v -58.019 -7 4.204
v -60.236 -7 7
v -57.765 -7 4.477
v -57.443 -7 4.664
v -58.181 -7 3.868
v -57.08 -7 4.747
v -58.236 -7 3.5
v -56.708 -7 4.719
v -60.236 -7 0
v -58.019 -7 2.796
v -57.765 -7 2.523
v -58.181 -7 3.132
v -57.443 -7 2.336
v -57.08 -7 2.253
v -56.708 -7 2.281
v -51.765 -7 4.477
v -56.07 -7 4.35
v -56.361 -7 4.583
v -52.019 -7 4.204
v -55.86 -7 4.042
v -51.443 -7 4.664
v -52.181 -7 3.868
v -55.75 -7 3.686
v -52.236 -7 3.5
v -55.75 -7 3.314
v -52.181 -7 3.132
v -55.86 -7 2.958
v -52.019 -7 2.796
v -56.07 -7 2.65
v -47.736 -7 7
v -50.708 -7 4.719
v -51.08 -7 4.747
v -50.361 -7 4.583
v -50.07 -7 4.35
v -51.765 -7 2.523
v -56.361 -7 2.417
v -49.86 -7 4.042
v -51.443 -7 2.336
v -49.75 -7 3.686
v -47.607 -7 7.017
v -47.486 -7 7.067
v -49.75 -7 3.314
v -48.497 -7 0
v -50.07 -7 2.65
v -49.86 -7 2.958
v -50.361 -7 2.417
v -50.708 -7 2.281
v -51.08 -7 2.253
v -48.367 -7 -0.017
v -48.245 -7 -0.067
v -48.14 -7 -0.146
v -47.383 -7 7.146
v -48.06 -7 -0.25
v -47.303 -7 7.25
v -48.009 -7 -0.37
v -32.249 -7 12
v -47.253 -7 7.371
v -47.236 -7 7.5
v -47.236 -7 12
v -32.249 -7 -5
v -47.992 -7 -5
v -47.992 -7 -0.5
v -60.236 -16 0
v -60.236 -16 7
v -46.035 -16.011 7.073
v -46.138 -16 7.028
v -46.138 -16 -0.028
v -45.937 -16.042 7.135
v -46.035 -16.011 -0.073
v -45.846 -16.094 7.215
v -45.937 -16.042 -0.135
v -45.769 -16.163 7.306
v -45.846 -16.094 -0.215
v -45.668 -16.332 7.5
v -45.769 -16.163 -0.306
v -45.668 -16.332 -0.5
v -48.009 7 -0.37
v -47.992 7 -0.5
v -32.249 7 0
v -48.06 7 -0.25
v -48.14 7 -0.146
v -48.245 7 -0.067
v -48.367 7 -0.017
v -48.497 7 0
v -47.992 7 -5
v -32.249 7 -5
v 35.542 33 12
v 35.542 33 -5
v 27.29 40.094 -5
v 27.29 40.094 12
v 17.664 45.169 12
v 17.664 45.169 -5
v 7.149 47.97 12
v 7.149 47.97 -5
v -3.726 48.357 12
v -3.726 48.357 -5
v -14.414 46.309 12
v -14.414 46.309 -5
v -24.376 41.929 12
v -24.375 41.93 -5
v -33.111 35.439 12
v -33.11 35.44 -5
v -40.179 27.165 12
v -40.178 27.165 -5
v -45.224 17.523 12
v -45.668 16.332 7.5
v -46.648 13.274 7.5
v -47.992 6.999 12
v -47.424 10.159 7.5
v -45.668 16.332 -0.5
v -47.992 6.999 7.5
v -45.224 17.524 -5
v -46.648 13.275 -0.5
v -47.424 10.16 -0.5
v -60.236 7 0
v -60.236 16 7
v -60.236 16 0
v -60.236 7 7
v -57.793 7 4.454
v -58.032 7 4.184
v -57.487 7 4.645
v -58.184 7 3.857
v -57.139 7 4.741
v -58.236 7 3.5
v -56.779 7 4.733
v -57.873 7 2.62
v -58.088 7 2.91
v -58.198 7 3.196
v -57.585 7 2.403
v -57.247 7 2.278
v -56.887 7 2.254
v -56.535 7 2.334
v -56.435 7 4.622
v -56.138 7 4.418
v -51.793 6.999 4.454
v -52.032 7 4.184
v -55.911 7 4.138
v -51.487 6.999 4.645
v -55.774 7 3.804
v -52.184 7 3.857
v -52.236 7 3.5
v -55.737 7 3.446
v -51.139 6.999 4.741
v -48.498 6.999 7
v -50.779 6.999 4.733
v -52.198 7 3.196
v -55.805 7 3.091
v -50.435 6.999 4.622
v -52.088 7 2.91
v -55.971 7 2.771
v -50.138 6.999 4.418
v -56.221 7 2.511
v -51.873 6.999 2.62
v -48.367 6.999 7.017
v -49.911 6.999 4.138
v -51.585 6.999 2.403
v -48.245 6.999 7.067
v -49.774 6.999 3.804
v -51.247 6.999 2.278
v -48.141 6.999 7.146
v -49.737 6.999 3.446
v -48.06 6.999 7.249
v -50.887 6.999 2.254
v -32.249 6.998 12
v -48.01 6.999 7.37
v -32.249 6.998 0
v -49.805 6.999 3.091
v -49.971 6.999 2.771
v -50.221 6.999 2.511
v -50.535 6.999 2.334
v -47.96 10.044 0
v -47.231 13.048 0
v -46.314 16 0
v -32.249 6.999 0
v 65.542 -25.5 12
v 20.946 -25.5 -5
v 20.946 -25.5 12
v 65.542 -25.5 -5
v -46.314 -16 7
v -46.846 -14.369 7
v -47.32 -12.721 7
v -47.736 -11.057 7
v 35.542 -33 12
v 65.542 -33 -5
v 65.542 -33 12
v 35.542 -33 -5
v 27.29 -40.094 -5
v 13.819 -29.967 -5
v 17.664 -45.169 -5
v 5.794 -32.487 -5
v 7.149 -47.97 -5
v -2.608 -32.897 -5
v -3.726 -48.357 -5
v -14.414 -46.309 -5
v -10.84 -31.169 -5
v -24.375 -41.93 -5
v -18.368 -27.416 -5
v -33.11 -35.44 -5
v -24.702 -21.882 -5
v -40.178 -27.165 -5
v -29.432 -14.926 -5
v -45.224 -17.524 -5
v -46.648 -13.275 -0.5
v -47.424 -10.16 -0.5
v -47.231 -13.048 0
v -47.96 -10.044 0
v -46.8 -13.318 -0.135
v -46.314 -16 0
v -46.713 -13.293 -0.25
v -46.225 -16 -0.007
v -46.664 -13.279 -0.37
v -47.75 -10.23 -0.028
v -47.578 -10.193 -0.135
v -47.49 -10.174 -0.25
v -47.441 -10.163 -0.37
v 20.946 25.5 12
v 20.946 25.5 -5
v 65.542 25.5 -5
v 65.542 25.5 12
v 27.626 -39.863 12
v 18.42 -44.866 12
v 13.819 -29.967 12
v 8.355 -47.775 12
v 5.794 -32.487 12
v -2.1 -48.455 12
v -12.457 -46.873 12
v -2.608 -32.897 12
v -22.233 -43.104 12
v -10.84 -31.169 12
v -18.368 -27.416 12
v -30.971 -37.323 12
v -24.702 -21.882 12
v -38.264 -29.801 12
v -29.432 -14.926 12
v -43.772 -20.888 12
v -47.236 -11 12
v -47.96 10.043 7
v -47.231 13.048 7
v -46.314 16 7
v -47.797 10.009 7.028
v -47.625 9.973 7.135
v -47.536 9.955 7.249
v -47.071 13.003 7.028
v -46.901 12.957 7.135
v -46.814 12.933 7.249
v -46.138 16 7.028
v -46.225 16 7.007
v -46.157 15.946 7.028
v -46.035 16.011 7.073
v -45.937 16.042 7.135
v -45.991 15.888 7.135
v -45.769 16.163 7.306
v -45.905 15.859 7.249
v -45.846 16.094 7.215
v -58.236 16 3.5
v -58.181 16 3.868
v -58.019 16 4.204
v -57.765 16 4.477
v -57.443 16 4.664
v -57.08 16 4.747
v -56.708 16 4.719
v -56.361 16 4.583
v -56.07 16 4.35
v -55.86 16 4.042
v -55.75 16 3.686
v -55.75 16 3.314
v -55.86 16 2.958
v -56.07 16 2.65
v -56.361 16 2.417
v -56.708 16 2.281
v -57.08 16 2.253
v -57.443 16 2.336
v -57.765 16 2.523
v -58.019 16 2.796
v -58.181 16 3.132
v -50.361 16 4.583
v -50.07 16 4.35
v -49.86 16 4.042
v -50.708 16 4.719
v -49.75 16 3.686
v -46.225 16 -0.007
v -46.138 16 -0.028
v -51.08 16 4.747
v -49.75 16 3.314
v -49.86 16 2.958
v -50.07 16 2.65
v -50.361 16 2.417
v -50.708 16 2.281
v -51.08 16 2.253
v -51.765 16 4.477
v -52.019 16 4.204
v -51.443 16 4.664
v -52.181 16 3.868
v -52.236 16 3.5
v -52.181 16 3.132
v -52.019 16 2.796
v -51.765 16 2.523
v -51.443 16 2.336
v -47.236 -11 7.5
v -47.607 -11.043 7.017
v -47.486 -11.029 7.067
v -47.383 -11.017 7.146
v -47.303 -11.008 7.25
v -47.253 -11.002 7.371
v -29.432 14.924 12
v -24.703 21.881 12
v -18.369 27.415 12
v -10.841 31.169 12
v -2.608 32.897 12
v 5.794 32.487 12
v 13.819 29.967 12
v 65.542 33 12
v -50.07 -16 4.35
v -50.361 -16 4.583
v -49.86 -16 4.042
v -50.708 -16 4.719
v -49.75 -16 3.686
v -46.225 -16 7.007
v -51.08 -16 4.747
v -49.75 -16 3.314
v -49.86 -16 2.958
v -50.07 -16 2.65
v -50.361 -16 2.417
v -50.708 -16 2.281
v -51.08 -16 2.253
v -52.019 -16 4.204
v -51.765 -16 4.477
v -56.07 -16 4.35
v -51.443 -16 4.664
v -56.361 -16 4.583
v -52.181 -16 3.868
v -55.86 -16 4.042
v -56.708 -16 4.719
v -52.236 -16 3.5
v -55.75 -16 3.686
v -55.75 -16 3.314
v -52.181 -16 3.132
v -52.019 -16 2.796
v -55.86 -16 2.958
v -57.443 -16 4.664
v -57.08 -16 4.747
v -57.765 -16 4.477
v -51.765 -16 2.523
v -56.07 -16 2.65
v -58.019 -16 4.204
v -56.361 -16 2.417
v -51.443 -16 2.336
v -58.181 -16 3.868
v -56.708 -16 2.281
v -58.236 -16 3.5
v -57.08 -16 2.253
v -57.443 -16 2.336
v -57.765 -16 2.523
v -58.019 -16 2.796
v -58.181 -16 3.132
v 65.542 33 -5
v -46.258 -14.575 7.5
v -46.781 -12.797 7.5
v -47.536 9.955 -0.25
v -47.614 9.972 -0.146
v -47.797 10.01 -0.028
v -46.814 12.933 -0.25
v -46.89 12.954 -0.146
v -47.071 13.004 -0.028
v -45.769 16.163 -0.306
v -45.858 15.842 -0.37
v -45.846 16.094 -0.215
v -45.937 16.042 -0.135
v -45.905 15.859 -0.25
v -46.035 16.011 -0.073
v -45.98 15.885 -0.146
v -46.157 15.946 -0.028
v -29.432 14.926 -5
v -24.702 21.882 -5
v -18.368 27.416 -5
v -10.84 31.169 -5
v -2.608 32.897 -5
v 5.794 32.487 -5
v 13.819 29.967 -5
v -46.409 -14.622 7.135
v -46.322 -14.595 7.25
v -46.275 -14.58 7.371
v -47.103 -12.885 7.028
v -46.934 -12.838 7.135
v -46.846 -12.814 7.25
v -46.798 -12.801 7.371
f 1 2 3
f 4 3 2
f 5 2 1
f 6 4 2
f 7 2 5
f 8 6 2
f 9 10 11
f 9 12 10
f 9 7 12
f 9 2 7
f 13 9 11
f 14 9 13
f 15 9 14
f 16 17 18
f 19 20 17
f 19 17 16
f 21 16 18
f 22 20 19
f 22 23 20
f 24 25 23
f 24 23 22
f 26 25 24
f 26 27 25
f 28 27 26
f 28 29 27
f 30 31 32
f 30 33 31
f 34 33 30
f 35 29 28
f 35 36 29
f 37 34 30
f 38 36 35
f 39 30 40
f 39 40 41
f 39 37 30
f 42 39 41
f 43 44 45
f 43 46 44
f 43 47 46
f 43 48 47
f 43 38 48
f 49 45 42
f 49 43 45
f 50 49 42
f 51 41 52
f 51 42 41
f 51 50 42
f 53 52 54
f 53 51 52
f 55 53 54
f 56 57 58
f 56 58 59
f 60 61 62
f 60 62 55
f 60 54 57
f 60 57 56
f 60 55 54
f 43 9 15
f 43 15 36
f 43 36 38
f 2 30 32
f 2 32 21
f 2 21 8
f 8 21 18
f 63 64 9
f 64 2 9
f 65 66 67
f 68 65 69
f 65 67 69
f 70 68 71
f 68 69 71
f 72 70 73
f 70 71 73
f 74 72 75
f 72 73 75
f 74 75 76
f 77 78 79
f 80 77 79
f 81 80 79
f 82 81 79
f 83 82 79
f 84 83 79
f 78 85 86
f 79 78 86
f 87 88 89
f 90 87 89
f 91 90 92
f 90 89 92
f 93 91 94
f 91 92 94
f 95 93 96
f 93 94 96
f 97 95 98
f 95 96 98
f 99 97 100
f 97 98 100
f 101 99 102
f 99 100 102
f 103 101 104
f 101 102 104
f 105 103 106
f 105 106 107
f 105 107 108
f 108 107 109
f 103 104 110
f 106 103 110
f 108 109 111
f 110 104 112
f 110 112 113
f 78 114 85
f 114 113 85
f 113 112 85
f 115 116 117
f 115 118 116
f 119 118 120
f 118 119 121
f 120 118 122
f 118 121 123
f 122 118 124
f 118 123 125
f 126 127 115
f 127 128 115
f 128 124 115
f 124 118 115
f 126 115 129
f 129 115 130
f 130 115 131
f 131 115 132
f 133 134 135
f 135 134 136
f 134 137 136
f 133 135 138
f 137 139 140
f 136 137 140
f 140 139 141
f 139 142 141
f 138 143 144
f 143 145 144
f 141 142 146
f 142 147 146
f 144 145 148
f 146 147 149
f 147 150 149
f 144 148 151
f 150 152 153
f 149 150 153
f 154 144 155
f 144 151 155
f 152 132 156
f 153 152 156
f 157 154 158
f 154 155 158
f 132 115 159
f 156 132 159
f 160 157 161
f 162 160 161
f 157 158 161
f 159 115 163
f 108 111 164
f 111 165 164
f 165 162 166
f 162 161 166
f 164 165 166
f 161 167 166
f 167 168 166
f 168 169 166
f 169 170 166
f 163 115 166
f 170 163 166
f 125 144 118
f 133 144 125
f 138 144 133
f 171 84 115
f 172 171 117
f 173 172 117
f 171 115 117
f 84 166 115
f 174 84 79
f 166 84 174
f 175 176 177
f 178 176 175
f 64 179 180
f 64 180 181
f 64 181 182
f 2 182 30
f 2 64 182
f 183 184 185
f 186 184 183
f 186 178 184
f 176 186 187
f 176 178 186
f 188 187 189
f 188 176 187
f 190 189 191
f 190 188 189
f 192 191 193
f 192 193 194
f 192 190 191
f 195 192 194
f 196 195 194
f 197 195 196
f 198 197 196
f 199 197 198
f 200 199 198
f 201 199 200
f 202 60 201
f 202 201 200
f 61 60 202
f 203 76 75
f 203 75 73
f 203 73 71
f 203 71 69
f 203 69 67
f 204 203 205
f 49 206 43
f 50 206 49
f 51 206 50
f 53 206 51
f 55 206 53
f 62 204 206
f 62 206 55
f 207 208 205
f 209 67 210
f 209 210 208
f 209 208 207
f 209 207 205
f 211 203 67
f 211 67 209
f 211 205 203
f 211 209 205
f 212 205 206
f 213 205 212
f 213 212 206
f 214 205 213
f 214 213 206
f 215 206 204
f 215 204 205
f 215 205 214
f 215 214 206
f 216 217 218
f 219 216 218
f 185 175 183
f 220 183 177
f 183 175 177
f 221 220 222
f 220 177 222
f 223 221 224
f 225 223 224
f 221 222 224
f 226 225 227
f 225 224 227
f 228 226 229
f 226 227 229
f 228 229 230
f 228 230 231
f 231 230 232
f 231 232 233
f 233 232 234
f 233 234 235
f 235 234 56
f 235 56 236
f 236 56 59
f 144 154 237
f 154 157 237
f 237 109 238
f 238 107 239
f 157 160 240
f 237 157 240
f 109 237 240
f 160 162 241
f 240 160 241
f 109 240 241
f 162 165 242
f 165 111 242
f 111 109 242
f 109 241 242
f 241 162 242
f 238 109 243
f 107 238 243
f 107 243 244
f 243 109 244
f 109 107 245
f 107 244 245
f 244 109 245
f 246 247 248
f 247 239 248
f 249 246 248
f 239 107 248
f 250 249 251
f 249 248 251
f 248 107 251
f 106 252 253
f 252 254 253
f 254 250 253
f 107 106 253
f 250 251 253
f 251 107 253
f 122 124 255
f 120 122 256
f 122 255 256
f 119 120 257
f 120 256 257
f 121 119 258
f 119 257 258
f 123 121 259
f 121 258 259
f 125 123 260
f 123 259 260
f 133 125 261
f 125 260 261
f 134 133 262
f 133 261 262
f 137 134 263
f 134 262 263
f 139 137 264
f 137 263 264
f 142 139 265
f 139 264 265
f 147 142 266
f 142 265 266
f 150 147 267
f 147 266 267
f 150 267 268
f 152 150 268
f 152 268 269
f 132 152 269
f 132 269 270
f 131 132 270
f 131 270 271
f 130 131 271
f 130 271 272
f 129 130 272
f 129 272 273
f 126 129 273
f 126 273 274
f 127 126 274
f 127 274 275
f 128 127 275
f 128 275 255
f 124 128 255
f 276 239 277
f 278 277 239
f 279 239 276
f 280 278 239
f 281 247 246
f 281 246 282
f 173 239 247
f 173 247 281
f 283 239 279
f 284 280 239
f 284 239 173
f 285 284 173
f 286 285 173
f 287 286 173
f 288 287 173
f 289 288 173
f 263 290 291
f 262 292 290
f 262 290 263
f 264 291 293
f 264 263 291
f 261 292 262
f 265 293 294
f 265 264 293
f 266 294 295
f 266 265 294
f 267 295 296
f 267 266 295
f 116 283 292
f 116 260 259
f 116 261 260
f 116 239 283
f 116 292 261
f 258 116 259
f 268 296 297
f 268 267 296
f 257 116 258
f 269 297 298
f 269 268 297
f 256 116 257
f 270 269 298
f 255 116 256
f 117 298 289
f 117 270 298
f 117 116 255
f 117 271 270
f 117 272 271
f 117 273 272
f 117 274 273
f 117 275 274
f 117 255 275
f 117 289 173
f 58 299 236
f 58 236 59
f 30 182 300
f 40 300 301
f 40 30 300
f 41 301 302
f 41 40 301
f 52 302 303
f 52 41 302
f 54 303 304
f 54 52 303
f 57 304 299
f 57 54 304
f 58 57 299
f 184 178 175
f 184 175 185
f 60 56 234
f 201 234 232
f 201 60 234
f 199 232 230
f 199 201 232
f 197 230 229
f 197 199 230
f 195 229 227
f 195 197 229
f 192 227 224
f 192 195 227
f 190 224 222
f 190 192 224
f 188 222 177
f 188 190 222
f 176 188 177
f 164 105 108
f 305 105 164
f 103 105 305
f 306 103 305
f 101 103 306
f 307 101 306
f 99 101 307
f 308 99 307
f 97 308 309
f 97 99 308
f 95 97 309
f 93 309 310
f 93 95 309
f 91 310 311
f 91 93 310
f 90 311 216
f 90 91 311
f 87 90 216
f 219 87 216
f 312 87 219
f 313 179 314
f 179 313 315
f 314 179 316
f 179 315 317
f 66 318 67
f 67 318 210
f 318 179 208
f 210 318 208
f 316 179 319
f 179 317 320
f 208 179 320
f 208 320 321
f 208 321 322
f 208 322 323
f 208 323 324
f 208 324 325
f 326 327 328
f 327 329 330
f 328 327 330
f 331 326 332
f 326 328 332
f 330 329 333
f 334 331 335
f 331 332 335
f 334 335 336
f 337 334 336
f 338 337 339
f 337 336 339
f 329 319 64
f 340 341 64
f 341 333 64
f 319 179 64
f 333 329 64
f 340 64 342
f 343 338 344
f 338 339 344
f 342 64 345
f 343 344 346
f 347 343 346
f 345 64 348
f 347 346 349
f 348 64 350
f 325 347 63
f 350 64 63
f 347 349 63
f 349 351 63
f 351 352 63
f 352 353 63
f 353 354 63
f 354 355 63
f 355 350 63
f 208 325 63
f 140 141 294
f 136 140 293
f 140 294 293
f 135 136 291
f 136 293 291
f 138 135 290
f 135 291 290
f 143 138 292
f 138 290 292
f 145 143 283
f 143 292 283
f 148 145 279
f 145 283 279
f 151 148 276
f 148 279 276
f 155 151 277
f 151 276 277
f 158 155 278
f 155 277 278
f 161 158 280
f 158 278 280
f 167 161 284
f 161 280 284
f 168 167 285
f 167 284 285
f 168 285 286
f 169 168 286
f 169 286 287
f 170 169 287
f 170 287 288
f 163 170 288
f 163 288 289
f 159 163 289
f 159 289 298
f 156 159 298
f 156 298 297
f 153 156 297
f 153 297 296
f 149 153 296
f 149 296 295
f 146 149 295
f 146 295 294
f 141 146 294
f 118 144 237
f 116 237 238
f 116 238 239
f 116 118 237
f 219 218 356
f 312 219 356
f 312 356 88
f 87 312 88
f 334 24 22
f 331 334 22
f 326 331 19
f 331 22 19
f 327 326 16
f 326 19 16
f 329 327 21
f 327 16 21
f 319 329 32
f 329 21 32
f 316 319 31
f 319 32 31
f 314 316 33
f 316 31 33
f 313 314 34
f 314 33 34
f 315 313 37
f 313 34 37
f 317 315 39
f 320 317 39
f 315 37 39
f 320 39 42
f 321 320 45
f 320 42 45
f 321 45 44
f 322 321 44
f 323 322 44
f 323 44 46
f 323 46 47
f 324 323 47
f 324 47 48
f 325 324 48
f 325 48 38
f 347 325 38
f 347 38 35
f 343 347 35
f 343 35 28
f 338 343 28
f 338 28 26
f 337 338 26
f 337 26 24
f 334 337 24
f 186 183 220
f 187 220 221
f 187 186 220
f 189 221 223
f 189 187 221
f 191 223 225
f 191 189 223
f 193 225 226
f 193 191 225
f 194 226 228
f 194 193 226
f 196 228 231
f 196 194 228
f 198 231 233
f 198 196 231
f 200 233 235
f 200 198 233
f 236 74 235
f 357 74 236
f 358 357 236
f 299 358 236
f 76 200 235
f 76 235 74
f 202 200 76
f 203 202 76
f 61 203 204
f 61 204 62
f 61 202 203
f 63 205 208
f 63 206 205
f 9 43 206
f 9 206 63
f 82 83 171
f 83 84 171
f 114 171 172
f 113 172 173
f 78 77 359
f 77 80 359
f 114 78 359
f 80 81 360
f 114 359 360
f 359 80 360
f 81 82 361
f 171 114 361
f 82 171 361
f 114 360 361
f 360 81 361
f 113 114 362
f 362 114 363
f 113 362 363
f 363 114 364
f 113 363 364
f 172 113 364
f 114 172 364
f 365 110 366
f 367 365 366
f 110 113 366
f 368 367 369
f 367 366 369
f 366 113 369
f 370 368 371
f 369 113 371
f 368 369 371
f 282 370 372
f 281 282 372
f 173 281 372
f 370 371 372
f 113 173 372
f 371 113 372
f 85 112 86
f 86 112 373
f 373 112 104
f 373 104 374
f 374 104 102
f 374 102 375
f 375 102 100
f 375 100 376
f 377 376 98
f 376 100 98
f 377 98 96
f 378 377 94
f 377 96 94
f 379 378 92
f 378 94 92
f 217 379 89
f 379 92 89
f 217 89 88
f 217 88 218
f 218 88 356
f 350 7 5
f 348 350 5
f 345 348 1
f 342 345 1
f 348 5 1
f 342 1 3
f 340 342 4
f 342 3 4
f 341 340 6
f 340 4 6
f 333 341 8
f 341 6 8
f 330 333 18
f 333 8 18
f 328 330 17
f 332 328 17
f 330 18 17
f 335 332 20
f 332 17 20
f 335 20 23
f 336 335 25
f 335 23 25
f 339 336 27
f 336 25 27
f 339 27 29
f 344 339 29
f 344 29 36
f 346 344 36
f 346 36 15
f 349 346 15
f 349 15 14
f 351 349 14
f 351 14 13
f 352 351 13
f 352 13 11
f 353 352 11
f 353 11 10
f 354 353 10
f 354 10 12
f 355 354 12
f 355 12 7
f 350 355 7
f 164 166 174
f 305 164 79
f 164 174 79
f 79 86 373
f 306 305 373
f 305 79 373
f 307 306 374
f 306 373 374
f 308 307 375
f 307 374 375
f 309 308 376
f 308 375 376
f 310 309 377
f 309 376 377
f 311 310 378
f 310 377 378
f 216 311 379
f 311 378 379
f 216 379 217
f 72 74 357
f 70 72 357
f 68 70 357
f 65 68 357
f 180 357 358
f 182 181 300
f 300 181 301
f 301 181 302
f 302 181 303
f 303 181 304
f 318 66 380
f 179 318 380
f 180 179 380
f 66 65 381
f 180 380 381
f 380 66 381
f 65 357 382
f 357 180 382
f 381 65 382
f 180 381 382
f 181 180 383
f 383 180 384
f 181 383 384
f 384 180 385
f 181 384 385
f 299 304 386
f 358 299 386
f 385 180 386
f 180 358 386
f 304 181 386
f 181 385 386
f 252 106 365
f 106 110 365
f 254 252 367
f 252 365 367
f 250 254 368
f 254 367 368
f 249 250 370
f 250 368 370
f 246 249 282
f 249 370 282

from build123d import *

# Parameters (mm, degrees)
BOSS_EXTRUDE1_DEPTH   = 7
BOSS_EXTRUDE1_2_DEPTH = 7
BOSS_EXTRUDE2_DEPTH   = 5
BOSS_EXTRUDE3_START   = 5
BOSS_EXTRUDE3_DEPTH   = 5
SKETCH9_W             = 13
SKETCH9_H             = 7.000000000000001
BOSS_EXTRUDE4_DEPTH   = 5
SKETCH10_W            = 13
SKETCH10_H            = 7.000000000000001
BOSS_EXTRUDE5_DEPTH   = 5
CUT_EXTRUDE2_REACH    = 94.736
SKETCH11_R            = 1.2499999999999976
SKETCH11_R_2          = 1.2500000000000044
BOSS_EXTRUDE6_REACH   = 125.35
SKETCH12_W            = 7.000000000000001
SKETCH12_H            = 5
FILLET3_R             = 0.5
FILLET4_R             = 0.5


with BuildPart() as part:
    # Sketch1 → Boss-Extrude1 (new body)
    with BuildSketch(Plane.XY):
        with BuildLine():
            ThreePointArc((20.94636006565342, 25.5), (-10.840556403898217, 31.168611404005503), (-32.249394973924254, 6.99832292880438))
            Line((-32.249394973924254, 6.99832292880438), (-60.23610906922786, 6.999999999999992))
            Line((-60.23610906922786, 6.999999999999992), (-60.23610906922786, 10.999999999999993))
            Line((-60.23610906922786, 10.999999999999993), (-47.23610906922786, 11))
            ThreePointArc((-47.23610906922786, 11), (-12.457395845309785, 46.872841697013044), (35.54222840509562, 33))
            Line((35.54222840509562, 33), (65.54222840509566, 33.00000000000006))
            Line((65.54222840509566, 33.00000000000006), (65.54222840509566, 25.5))
            Line((65.54222840509566, 25.5), (20.94636006565342, 25.5))
        make_face()
    extrude(amount=BOSS_EXTRUDE1_DEPTH)



with BuildPart() as body_2:
    # Sketch1 → Boss-Extrude1 2 (new body)
    with BuildSketch(Plane.XY):
        with BuildLine():
            ThreePointArc((-32.24903099319419, -7.000000000000025), (-10.839745962155684, -31.16889326678009), (20.94636006565327, -25.500000000000124))
            Line((20.94636006565327, -25.500000000000124), (65.54222840509566, -25.5))
            Line((65.54222840509566, -25.5), (65.54222840509566, -33))
            Line((65.54222840509566, -33), (35.54222840509578, -33))
            ThreePointArc((35.54222840509578, -33), (-12.45739584530974, -46.8728416970131), (-47.23610906922786, -10.99999999999999))
            Line((-47.23610906922786, -10.99999999999999), (-60.23610906922786, -11.000000000000007))
            Line((-60.23610906922786, -11.000000000000007), (-60.23610906922786, -7.000000000000008))
            Line((-60.23610906922786, -7.000000000000008), (-32.24903099319419, -7.000000000000025))
        make_face()
    extrude(amount=BOSS_EXTRUDE1_2_DEPTH)


with BuildPart() as part_1:
    add(part.part)

    add(body_2.part)  # Boss-Extrude2 merges body 2
    # Sketch7 → Boss-Extrude2 (add)
    with BuildSketch(Plane.XY.offset(7)):
        with BuildLine():
            Line((-47.23610906922786, -10.99999999999999), (-47.23610906922786, -7.000000000000016))
            Line((-47.23610906922786, -7.000000000000016), (-32.24903099319419, -7.000000000000025))
            ThreePointArc((-32.24903099319419, -7.000000000000025), (-10.839745962155684, -31.16889326678009), (20.94636006565327, -25.500000000000124))
            Line((20.94636006565327, -25.500000000000124), (65.54222840509566, -25.5))
            Line((65.54222840509566, -25.5), (65.54222840509566, -33))
            Line((65.54222840509566, -33), (35.54222840509578, -33))
            ThreePointArc((35.54222840509578, -33), (-12.45739584530974, -46.8728416970131), (-47.23610906922786, -10.99999999999999))
        make_face()
        with BuildLine():
            Line((20.94636006565342, 25.5), (65.54222840509566, 25.5))
            Line((65.54222840509566, 25.5), (65.54222840509566, 33.00000000000006))
            Line((65.54222840509566, 33.00000000000006), (35.54222840509562, 33))
            ThreePointArc((35.54222840509562, 33), (-14.413901995191612, 46.30863234077419), (-47.99229387318852, 6.999266303656799))
            Line((-47.99229387318852, 6.999266303656799), (-32.249394973924254, 6.998322928804379))
            ThreePointArc((-32.249394973924254, 6.998322928804379), (-10.840556403898217, 31.168611404005503), (20.94636006565342, 25.5))
        make_face()
    extrude(amount=BOSS_EXTRUDE2_DEPTH)

    # Sketch8 → Boss-Extrude3 (add)
    with BuildSketch(Plane(origin=(0, 0, 0), x_dir=(-1, 0, 0), z_dir=(0, 0, -1)).offset(BOSS_EXTRUDE3_START)):
        with BuildLine():
            ThreePointArc((32.24903099319419, 7.000000000000025), (10.839745962155687, 31.16889326678009), (-20.94636006565327, 25.500000000000124))
            Line((-20.94636006565327, 25.500000000000124), (-65.54222840509566, 25.5))
            Line((-65.54222840509566, 25.5), (-65.54222840509566, 33))
            Line((-65.54222840509566, 33), (-35.54222840509565, 32.999999999999986))
            ThreePointArc((-35.54222840509565, 32.999999999999986), (14.41354801594032, 46.30874251793252), (47.9921868641135, 7.000000000000016))
            Line((47.9921868641135, 7.000000000000016), (32.24903099319419, 7.000000000000025))
        make_face()
        with BuildLine():
            Line((47.9921868641135, -7.000000000000016), (32.24903099319419, -7.000000000000025))
            ThreePointArc((32.2490309931942, -7.000000000000025), (10.839745962155696, -31.168893266780103), (-20.946360065653273, -25.500000000000128))
            Line((-20.94636006565327, -25.500000000000124), (-65.54222840509566, -25.5))
            Line((-65.54222840509566, -25.5), (-65.54222840509566, -33))
            Line((-65.54222840509566, -33), (-35.54222840509565, -32.999999999999986))
            ThreePointArc((-35.54222840509565, -32.999999999999986), (12.457395845309772, -46.87284169701305), (47.23610906922784, -10.999999999999988))
            ThreePointArc((47.23610906922784, -10.999999999999988), (47.656133777217065, -9.007936134763595), (47.9921868641135, -7.000000000000023))
        make_face()
    extrude(amount=-BOSS_EXTRUDE3_DEPTH)

    # Sketch9 → Boss-Extrude4 (add)
    with BuildSketch(Plane(origin=(-5.87e-15, 11.000000000000025, 0), x_dir=(1, 5.3e-16, 0), z_dir=(-5.3e-16, 1, 0))):
        with Locations((-53.73610906922785, -3.5000000000000004)):
            Rectangle(SKETCH9_W, SKETCH9_H)
    extrude(amount=BOSS_EXTRUDE4_DEPTH)

    # Sketch10 → Boss-Extrude5 (add)
    with BuildSketch(Plane(origin=(1.468e-14, -10.999999999999927, 0), x_dir=(-1, -1.33e-15, 0), z_dir=(1.33e-15, -1, 0))):
        with Locations((53.73610906922787, -3.5000000000000004)):
            Rectangle(SKETCH10_W, SKETCH10_H)
    extrude(amount=BOSS_EXTRUDE5_DEPTH)

    # Cut-Extrude2: up to this face of the body (flat: up to its plane)
    cut_extrude2_end = Plane(part_1.part.faces().sort_by_distance((-53.736109069, -16, 3.5))[0])
    # Sketch11 → Cut-Extrude2 (cut, up to the picked face)
    with BuildSketch(Plane(origin=(-8.54e-15, 16.000000000000025, 0), x_dir=(1, 5.3e-16, 0), z_dir=(-5.3e-16, 1, 0)), mode=Mode.PRIVATE) as cut_extrude2_sk1:
        with Locations(Location((-56.986109069227844, -3.5000000000000018, 0), (0, 0, 180))):
            Circle(SKETCH11_R)
    cut_extrude2_tool1 = split(extrude(cut_extrude2_sk1.sketch, amount=-CUT_EXTRUDE2_REACH, mode=Mode.PRIVATE), bisect_by=cut_extrude2_end, keep=Keep.BOTH, mode=Mode.PRIVATE)
    # Sketch11 → Cut-Extrude2 (cut, up to the picked face)
    with BuildSketch(Plane(origin=(-8.54e-15, 16.000000000000025, 0), x_dir=(1, 5.3e-16, 0), z_dir=(-5.3e-16, 1, 0)), mode=Mode.PRIVATE) as cut_extrude2_sk2:
        with Locations(Location((-50.98610906922785, -3.5000000000000004, 0), (0, 0, 180))):
            Circle(SKETCH11_R_2)
    cut_extrude2_tool2 = split(extrude(cut_extrude2_sk2.sketch, amount=-CUT_EXTRUDE2_REACH, mode=Mode.PRIVATE), bisect_by=cut_extrude2_end, keep=Keep.BOTH, mode=Mode.PRIVATE)
    add(cut_extrude2_tool1.solids().sort_by(Axis((-56.986109, 16, 3.5), (5.3e-16, -1, 0)))[0], mode=Mode.SUBTRACT)
    add(cut_extrude2_tool2.solids().sort_by(Axis((-50.986109, 16, 3.5), (5.3e-16, -1, 0)))[0], mode=Mode.SUBTRACT)

    # Sketch12 → Boss-Extrude6 (add, up to next)
    with BuildSketch(Plane(origin=(-47.23610906922785, -2.521e-14, 0), x_dir=(0, 0, -1), z_dir=(1, 5.3e-16, 0)), mode=Mode.PRIVATE) as boss_extrude6_sk1:
        with Locations((-3.5000000000000004, -13.500000000000025)):
            Rectangle(SKETCH12_W, SKETCH12_H)
    boss_extrude6_tool1 = extrude(boss_extrude6_sk1.sketch, amount=BOSS_EXTRUDE6_REACH, mode=Mode.PRIVATE) - part_1.part
    # Sketch12 → Boss-Extrude6 (add, up to next)
    with BuildSketch(Plane(origin=(-47.23610906922785, -2.521e-14, 0), x_dir=(0, 0, -1), z_dir=(1, 5.3e-16, 0)), mode=Mode.PRIVATE) as boss_extrude6_sk2:
        with Locations((-3.5000000000000004, 13.500000000000025)):
            Rectangle(SKETCH12_W, SKETCH12_H)
    boss_extrude6_tool2 = extrude(boss_extrude6_sk2.sketch, amount=BOSS_EXTRUDE6_REACH, mode=Mode.PRIVATE) - part_1.part
    add(boss_extrude6_tool1.solids().sort_by_distance((-47.236109, -13.5, 3.5))[0])
    add(boss_extrude6_tool2.solids().sort_by_distance((-47.236109, 13.5, 3.5))[0])

    # Fillet3
    fillet3_edges = [part_1.edges().sort_by_distance(p)[0] for p in [
        (-47.104035976259524, 11.552480025831594, 7),
        (-47.10394766881262, 11.552840084314855, 0),
        (-45.784822812805444, 15.999999999999996, 3.5),
    ]]
    fillet(fillet3_edges, radius=FILLET3_R)

    # Fillet4
    fillet4_edges = [part_1.edges().sort_by_distance(p)[0] for p in [
        (-45.78482281280543, -16.000000000000046, 3.5),
        (-46.5776066586774, -13.5194880801575, 7),
        (-47.23610906922786, -9.000000000000004, 7),
        (-47.10394766881262, -11.552840084314882, 0),
    ]]
    fillet(fillet4_edges, radius=FILLET4_R)


solid = part_1.part
